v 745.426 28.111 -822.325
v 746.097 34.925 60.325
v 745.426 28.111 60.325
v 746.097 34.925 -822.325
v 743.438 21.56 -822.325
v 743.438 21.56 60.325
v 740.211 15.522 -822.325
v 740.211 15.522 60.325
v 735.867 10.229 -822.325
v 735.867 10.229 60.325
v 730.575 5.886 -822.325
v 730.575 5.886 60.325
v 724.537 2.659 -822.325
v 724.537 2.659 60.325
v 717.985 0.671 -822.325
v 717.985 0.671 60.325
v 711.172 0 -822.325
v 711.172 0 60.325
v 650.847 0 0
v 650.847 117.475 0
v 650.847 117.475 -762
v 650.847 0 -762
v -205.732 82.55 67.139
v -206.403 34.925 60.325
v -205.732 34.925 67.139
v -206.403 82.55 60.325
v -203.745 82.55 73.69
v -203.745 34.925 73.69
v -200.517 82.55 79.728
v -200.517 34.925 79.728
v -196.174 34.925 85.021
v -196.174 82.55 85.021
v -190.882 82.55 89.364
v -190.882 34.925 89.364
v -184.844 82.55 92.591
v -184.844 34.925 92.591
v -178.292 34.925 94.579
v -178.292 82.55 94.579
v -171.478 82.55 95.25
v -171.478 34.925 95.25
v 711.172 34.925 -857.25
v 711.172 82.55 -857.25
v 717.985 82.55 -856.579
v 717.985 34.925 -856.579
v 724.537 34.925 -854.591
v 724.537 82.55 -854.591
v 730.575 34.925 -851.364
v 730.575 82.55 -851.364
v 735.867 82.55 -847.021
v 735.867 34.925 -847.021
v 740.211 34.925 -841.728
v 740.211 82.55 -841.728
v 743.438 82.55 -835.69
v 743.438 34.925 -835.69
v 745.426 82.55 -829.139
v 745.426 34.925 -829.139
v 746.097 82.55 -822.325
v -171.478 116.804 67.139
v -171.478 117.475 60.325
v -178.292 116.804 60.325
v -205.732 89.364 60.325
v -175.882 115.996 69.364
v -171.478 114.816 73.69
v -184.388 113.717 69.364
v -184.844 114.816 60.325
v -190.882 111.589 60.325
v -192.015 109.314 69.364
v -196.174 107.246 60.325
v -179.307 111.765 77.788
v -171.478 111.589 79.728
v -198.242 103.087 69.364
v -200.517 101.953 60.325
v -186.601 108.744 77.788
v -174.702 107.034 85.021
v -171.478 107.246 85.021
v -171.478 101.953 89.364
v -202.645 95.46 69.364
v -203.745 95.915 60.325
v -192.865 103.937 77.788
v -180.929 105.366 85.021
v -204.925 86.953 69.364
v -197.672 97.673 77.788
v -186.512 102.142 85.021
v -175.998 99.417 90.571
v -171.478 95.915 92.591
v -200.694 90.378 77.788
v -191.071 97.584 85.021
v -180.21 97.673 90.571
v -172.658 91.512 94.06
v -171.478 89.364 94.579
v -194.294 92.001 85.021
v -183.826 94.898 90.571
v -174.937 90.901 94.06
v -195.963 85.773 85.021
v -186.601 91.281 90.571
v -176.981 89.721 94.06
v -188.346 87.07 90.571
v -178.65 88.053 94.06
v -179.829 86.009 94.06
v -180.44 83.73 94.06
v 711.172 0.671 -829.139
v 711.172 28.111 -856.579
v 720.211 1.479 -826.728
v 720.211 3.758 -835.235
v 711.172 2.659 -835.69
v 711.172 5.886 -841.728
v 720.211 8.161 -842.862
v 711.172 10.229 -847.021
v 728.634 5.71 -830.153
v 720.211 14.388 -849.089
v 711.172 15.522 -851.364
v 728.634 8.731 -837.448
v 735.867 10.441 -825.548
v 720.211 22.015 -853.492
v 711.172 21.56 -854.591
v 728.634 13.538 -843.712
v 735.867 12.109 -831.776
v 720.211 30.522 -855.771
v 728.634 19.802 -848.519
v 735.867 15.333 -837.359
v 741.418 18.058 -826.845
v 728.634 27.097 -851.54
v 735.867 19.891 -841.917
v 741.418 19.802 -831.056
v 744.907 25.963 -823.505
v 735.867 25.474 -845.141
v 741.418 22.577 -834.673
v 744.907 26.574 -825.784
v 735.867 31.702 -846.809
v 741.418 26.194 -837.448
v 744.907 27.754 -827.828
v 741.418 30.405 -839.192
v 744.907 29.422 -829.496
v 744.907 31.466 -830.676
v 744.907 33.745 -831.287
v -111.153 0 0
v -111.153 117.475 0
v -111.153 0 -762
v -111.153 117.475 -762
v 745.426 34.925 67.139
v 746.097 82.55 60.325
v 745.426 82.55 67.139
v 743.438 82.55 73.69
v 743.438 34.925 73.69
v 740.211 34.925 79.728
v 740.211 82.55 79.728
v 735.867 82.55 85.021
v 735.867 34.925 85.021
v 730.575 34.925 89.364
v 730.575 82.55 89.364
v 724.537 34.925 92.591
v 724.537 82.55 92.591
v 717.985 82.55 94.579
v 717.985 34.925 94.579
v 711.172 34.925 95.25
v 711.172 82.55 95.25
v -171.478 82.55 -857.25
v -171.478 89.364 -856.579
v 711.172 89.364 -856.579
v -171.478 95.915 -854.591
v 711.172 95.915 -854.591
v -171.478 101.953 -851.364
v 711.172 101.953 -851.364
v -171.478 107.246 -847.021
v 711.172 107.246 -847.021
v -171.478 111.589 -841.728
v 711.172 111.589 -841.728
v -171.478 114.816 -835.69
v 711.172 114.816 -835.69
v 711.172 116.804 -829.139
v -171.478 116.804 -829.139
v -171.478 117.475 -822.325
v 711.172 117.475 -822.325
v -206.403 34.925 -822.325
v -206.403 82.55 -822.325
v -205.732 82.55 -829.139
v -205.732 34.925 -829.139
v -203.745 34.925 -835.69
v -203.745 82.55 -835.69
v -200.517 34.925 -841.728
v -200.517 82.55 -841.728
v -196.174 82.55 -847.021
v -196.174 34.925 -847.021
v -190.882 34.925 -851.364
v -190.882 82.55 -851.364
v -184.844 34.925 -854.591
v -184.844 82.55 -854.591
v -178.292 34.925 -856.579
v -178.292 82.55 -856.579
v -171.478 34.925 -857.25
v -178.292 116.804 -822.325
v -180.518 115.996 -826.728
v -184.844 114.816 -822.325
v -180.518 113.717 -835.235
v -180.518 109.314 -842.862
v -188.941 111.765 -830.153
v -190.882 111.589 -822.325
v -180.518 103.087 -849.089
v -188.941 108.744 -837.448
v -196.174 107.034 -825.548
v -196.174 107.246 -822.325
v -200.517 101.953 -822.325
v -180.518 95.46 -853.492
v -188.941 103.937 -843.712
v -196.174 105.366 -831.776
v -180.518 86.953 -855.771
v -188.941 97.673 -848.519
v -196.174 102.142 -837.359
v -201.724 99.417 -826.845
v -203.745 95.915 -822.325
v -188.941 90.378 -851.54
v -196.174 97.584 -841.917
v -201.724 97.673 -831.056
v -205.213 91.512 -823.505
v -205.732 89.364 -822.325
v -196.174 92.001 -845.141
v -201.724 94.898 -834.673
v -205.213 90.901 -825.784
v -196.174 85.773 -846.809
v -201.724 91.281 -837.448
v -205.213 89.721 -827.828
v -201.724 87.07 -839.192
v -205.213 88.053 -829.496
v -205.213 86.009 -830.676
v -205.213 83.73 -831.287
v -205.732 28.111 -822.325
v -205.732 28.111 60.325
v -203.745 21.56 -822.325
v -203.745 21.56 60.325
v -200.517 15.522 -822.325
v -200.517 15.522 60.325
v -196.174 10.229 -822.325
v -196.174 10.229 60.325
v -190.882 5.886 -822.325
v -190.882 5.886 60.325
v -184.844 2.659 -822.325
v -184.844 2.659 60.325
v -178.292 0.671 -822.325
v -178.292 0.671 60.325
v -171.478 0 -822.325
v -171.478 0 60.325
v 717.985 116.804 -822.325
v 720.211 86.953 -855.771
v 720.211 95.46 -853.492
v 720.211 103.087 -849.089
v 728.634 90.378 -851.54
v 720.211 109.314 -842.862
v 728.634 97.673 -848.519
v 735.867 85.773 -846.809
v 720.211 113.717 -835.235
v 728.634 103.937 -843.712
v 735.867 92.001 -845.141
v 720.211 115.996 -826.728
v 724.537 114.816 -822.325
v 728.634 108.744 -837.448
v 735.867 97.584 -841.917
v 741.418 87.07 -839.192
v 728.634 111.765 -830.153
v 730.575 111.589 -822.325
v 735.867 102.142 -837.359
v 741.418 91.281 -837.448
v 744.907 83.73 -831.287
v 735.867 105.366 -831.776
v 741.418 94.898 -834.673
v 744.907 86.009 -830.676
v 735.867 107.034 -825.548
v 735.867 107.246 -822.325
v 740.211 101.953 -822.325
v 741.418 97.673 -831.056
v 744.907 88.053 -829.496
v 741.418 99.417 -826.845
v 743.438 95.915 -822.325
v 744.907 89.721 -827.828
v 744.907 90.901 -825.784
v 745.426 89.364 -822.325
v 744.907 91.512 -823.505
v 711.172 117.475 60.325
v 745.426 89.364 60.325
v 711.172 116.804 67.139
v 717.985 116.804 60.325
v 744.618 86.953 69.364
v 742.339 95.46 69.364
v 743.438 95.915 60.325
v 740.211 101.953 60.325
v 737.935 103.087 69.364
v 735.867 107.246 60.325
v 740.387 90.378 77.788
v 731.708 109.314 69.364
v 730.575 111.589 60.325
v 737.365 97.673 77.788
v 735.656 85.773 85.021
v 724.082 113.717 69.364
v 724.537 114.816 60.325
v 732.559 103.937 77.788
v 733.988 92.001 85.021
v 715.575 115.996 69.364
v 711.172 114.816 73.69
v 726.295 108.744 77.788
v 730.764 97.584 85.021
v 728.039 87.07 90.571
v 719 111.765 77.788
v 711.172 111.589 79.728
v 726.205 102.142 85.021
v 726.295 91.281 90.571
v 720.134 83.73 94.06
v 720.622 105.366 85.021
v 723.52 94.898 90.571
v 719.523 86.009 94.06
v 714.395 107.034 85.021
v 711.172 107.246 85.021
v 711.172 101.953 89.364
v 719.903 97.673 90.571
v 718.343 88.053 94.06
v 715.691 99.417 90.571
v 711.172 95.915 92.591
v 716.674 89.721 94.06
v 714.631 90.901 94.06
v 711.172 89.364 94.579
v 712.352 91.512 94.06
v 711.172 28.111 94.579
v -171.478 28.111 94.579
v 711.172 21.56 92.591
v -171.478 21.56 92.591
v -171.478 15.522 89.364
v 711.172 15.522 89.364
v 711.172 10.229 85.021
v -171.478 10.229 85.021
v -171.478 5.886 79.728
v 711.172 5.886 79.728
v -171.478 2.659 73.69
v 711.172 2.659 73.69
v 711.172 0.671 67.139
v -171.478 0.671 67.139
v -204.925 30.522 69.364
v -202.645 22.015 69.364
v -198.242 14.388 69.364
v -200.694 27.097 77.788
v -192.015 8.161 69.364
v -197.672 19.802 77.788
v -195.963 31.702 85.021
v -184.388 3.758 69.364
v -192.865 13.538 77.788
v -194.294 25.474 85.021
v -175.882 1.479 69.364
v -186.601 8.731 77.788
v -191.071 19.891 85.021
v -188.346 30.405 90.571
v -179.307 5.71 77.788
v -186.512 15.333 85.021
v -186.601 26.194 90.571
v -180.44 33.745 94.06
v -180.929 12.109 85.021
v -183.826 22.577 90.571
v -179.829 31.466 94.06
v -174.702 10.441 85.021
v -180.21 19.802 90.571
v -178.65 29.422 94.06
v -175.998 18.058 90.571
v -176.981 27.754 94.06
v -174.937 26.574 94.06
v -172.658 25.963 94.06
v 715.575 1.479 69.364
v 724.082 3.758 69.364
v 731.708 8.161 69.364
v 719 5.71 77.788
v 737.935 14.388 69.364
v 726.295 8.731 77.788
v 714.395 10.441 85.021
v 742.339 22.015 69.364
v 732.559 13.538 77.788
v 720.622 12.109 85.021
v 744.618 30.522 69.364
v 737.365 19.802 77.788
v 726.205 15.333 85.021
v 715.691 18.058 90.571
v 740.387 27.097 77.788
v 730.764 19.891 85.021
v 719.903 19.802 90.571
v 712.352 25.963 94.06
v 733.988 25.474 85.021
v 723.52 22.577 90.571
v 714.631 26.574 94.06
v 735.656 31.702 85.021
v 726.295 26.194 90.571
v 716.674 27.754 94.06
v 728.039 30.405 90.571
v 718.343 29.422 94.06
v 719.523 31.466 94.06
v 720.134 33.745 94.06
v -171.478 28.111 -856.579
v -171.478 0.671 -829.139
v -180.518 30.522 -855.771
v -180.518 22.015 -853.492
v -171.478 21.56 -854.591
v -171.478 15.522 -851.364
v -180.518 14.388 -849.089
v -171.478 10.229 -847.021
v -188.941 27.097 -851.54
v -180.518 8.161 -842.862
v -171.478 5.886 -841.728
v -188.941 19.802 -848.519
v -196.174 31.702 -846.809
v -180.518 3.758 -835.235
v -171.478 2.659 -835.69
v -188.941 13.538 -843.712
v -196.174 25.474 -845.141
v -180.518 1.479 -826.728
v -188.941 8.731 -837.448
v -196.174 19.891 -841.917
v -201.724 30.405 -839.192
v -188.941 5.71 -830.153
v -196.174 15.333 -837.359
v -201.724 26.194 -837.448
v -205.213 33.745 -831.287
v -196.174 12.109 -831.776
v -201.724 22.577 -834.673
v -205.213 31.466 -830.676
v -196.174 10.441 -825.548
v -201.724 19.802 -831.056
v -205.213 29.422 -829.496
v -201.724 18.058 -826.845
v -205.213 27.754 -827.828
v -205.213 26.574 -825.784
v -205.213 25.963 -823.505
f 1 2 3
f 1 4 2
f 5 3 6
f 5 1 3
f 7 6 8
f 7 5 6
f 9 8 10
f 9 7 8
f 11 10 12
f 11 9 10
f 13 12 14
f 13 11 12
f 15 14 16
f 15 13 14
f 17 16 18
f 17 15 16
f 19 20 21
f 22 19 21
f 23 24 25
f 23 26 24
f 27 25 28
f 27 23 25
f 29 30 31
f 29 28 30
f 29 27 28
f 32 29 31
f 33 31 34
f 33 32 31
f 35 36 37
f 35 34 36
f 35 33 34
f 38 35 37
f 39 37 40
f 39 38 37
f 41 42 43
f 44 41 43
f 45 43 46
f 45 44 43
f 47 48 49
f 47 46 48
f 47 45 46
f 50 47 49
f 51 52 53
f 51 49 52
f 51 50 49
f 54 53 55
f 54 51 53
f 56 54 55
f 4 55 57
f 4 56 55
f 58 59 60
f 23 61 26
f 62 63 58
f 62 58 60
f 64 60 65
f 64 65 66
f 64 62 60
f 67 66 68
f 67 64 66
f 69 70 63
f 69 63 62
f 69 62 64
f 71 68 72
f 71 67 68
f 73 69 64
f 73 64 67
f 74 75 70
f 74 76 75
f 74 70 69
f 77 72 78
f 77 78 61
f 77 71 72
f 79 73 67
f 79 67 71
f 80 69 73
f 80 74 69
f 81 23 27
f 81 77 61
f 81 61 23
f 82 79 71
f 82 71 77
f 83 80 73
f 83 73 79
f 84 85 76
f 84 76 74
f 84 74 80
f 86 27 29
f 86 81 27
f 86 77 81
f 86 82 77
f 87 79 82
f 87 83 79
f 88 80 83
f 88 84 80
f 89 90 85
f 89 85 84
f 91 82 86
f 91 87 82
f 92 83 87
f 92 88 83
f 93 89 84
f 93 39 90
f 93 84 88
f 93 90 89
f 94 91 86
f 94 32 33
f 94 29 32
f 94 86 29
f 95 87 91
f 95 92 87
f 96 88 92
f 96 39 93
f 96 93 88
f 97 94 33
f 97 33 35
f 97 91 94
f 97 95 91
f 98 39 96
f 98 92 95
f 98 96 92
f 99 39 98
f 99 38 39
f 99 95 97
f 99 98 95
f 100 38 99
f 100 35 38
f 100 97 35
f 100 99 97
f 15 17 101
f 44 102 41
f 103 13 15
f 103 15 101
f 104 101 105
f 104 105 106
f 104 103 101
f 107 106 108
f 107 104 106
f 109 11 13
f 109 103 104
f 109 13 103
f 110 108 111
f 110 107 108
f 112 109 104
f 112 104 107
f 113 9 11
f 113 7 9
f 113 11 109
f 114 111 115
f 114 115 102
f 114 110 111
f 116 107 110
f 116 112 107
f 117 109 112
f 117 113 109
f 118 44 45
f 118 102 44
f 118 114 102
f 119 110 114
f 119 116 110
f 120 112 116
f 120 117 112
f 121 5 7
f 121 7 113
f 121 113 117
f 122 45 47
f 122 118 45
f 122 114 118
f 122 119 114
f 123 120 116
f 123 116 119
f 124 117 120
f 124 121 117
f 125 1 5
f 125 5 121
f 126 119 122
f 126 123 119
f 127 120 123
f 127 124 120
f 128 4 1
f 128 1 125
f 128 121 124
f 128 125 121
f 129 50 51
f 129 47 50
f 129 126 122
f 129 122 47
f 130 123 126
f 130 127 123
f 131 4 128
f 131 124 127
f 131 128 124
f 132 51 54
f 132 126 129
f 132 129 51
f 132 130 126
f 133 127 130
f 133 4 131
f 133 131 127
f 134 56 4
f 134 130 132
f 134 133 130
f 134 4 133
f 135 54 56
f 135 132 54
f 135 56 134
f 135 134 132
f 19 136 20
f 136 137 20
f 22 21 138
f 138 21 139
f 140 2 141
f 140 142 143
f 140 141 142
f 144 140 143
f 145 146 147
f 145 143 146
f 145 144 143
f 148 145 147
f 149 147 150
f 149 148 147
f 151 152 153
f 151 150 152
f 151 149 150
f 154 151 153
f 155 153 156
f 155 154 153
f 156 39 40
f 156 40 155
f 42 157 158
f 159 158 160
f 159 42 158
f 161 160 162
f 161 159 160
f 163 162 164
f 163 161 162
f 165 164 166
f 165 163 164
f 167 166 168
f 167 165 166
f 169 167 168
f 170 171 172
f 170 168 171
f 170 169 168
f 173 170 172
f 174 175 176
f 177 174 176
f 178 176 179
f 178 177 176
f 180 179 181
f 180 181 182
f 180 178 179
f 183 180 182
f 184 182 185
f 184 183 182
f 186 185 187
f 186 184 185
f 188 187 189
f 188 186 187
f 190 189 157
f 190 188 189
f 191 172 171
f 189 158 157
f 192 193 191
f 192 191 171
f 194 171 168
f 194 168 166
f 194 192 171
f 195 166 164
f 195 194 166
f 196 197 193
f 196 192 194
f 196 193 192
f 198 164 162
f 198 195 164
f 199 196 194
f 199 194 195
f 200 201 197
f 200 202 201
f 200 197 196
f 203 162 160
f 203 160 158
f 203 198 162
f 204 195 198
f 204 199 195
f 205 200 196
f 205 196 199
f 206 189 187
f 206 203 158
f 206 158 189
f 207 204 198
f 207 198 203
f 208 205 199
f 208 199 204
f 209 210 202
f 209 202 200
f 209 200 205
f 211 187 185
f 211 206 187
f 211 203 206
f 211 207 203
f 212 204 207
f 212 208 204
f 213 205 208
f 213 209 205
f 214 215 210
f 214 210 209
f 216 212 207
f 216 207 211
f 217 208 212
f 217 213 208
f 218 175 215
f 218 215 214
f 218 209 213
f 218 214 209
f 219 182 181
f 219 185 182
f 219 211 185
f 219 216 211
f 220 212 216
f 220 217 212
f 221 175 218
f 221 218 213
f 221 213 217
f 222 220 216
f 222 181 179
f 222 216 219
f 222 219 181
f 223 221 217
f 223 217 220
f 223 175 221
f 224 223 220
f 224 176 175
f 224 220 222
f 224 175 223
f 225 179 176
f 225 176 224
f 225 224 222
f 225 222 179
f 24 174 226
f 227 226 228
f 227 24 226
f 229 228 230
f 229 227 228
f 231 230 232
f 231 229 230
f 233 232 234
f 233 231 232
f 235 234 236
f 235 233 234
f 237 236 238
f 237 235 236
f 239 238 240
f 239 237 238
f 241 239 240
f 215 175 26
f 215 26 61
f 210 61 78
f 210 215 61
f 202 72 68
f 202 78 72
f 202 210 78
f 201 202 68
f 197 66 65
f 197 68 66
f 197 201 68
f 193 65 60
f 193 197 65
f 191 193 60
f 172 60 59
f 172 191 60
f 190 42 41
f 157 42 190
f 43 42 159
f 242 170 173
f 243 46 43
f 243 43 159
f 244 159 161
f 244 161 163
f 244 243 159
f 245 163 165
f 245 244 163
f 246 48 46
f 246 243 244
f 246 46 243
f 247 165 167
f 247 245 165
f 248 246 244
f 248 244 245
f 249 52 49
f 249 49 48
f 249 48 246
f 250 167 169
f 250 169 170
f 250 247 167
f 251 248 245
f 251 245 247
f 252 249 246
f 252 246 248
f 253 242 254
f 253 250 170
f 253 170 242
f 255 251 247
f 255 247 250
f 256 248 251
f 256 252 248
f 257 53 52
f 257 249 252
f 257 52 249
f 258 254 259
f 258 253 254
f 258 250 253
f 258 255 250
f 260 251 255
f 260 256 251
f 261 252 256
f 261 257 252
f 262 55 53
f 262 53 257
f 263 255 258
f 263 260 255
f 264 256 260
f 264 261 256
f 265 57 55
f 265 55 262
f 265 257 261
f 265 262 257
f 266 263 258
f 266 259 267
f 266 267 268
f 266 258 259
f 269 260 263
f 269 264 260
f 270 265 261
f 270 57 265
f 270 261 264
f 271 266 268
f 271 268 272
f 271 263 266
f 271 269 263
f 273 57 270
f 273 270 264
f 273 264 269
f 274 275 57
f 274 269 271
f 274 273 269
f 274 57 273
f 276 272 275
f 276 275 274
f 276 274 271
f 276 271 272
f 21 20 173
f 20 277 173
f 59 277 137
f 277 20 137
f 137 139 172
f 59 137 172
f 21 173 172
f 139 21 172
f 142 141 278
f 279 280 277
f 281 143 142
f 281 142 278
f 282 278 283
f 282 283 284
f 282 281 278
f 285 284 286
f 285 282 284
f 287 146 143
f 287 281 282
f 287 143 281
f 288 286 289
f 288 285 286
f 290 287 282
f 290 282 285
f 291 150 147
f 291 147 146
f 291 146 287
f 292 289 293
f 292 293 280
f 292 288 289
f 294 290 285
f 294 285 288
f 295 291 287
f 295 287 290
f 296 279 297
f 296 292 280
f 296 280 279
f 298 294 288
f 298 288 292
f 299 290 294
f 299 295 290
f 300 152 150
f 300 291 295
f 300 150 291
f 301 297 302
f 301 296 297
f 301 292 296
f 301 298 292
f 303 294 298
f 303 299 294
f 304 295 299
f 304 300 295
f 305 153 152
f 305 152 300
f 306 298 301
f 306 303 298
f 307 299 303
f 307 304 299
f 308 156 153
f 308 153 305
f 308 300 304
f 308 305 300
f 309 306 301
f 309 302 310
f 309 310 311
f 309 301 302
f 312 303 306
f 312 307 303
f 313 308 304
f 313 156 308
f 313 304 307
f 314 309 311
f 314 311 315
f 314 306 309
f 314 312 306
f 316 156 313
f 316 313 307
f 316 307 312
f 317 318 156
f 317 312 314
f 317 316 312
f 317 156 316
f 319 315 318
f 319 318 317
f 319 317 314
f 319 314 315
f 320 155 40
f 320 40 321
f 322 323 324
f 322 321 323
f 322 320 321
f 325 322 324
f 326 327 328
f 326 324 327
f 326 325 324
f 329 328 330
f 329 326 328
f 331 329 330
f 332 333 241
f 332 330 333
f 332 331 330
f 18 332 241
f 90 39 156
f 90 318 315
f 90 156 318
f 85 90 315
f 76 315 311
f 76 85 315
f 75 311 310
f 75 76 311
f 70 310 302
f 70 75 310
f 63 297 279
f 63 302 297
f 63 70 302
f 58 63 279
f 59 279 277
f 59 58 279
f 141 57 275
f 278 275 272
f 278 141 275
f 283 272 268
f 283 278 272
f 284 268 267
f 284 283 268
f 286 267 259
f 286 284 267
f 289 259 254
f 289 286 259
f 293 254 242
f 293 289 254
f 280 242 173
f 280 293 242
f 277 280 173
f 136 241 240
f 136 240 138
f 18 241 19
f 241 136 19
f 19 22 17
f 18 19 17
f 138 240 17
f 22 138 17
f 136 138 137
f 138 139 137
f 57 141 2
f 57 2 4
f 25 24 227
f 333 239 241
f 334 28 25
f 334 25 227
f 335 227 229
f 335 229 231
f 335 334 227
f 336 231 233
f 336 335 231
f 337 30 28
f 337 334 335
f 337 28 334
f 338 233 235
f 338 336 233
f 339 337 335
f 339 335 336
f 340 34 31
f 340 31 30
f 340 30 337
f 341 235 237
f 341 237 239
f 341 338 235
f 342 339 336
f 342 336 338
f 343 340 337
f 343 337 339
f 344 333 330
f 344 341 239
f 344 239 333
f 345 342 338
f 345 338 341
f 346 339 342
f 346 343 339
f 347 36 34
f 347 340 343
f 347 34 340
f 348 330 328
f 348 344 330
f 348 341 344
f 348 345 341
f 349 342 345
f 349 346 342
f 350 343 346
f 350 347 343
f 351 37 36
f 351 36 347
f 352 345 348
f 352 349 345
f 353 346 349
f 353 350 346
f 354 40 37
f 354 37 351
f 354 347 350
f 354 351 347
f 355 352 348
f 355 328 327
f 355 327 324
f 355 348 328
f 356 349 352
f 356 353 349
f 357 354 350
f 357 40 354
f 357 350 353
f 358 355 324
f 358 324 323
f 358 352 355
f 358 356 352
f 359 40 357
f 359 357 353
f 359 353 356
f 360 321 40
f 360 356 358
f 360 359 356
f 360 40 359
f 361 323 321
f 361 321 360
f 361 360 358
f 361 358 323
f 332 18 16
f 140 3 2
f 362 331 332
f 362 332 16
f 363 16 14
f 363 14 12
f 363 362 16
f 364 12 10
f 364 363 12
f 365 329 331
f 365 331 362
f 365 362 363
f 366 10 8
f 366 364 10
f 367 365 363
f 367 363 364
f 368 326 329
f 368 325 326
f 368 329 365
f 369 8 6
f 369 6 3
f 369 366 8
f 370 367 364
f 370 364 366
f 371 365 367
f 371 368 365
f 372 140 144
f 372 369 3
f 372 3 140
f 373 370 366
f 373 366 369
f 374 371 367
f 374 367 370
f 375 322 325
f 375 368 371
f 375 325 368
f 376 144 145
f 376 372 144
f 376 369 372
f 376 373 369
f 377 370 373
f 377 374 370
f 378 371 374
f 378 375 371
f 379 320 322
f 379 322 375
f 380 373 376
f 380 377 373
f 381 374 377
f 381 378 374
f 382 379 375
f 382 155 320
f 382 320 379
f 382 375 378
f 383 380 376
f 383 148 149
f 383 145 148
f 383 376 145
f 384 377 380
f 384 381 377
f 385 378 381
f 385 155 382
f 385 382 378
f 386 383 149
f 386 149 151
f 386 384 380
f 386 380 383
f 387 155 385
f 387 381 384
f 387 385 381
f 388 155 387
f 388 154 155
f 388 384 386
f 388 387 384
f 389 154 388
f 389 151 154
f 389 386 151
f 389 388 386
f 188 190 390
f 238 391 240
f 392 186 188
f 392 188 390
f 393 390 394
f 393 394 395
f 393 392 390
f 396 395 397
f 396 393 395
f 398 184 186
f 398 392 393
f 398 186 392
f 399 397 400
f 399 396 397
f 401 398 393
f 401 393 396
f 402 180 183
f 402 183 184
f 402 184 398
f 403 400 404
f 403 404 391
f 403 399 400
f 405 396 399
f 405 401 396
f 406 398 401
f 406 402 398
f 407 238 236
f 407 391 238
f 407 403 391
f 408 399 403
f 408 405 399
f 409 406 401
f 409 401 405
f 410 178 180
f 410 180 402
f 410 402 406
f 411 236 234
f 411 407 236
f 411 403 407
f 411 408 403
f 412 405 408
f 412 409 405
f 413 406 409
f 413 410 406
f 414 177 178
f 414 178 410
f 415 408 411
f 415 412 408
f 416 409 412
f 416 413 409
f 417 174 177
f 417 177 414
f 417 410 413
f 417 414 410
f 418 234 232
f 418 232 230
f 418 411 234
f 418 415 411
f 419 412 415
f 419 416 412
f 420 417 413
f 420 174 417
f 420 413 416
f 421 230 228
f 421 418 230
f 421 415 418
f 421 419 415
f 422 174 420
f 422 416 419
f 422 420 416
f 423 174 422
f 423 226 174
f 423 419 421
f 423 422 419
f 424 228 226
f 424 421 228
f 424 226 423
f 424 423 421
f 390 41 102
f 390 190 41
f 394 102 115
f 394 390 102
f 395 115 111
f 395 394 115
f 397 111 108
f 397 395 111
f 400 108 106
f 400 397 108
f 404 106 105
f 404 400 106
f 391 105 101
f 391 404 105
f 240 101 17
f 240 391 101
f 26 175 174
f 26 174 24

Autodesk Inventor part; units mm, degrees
ref_plane "YZ Plane" through (0, 0, 0) normal (1, 0, 0) x (0, 1, 0)
ref_plane "XZ Plane" through (0, 0, 0) normal (0, 1, 0) x (-1, 0, 0)
ref_plane "XY Plane" through (0, 0, 0) normal (0, 0, 1) x (1, 0, 0)
sketch "Sketch1" plane through (0, 0, 0) normal (0, 0, 1) x (1, 0, 0)
  line L0 (-206.4033, 0) -> (746.0967, 0)
  line L1 (746.0967, 0) -> (746.0967, 117.475)
  line L2 (746.0967, 117.475) -> (-206.4033, 117.475)
  line L3 (-206.4033, 117.475) -> (-206.4033, 0)
  point P0 (0, 0)
  dimension "d0" = 952.5
  dimension "d1" = 117.475
extrude "Extrusion1" add sketch "Sketch1" along normal blind 95.25
sketch "Sketch3" plane through (-206.4033, 117.475, 0) normal (0, 1, 0) x (1, 0, 0)
  line L0 (952.5, 0) -> (0, 0) projected
  line L1 (0, 0) -> (95.25, 0)
  line L2 (952.5, -95.25) -> (0, -95.25) projected
  line L3 (95.25, 0) -> (0, -95.25)
  line L4 (952.5, 0) -> (857.25, 0)
  line L5 (857.25, 0) -> (952.5, -95.25)
  line L6 (0, -95.25) -> (0, 0)
  line L7 (0, 0) -> (95.25, 0)
  line L8 (857.25, 0) -> (952.5, 0)
  line L9 (952.5, 0) -> (952.5, -95.25)
  line L10 (95.25, 0) -> (857.25, 0)
  point P0 (206.4033, 0)
  dimension "d6" = 95.25
  dimension "d7" = 95.25
extrude "Extrusion2" cut sketch "Sketch3" against normal through all contours L9 L5 L0 | L3 L6 L0
fillet "Fillet1" radius 34.925 2 edges at (269.8467, 0, 95.25) (269.8467, 117.475, 95.25)
shell "Shell1" [suppressed]
sketch "Sketch4" plane through (-111.1533, 117.475, 0) normal (0, 1, 0) x (1, 0, 0)
  line L0 (762, 0) -> (0, 0) projected
  line L1 (381, 0) -> (381, 381)
  point P0 (111.1533, 0)
ref_plane "Work Plane1" through (269.8467, 107.475, -381) normal (0, 0, -1) x (0, 1, 0)
pattern_circular "Circular Pattern1" count 4 over 360 about axis through (269.8467, 107.475, -381) along (0, 1, 0)
fillet "Fillet3" radius 34.925 12 edges at (-196.174, 107.2457, -847.0207) (-196.174, 10.2293, -847.0207) (-206.4033, 58.7375, -857.25) (746.0967, 58.7375, -857.25) (735.8674, 10.2293, -847.0207) (735.8674, 107.2457, -847.0207) (735.8674, 107.2457, 85.0207) (735.8674, 10.2293, 85.0207) (746.0967, 58.7375, 95.25) (-196.174, 10.2293, 85.0207) (-196.174, 107.2457, 85.0207) (-206.4033, 58.7375, 95.25)
properties part number "2025 Bumper Fabric"
